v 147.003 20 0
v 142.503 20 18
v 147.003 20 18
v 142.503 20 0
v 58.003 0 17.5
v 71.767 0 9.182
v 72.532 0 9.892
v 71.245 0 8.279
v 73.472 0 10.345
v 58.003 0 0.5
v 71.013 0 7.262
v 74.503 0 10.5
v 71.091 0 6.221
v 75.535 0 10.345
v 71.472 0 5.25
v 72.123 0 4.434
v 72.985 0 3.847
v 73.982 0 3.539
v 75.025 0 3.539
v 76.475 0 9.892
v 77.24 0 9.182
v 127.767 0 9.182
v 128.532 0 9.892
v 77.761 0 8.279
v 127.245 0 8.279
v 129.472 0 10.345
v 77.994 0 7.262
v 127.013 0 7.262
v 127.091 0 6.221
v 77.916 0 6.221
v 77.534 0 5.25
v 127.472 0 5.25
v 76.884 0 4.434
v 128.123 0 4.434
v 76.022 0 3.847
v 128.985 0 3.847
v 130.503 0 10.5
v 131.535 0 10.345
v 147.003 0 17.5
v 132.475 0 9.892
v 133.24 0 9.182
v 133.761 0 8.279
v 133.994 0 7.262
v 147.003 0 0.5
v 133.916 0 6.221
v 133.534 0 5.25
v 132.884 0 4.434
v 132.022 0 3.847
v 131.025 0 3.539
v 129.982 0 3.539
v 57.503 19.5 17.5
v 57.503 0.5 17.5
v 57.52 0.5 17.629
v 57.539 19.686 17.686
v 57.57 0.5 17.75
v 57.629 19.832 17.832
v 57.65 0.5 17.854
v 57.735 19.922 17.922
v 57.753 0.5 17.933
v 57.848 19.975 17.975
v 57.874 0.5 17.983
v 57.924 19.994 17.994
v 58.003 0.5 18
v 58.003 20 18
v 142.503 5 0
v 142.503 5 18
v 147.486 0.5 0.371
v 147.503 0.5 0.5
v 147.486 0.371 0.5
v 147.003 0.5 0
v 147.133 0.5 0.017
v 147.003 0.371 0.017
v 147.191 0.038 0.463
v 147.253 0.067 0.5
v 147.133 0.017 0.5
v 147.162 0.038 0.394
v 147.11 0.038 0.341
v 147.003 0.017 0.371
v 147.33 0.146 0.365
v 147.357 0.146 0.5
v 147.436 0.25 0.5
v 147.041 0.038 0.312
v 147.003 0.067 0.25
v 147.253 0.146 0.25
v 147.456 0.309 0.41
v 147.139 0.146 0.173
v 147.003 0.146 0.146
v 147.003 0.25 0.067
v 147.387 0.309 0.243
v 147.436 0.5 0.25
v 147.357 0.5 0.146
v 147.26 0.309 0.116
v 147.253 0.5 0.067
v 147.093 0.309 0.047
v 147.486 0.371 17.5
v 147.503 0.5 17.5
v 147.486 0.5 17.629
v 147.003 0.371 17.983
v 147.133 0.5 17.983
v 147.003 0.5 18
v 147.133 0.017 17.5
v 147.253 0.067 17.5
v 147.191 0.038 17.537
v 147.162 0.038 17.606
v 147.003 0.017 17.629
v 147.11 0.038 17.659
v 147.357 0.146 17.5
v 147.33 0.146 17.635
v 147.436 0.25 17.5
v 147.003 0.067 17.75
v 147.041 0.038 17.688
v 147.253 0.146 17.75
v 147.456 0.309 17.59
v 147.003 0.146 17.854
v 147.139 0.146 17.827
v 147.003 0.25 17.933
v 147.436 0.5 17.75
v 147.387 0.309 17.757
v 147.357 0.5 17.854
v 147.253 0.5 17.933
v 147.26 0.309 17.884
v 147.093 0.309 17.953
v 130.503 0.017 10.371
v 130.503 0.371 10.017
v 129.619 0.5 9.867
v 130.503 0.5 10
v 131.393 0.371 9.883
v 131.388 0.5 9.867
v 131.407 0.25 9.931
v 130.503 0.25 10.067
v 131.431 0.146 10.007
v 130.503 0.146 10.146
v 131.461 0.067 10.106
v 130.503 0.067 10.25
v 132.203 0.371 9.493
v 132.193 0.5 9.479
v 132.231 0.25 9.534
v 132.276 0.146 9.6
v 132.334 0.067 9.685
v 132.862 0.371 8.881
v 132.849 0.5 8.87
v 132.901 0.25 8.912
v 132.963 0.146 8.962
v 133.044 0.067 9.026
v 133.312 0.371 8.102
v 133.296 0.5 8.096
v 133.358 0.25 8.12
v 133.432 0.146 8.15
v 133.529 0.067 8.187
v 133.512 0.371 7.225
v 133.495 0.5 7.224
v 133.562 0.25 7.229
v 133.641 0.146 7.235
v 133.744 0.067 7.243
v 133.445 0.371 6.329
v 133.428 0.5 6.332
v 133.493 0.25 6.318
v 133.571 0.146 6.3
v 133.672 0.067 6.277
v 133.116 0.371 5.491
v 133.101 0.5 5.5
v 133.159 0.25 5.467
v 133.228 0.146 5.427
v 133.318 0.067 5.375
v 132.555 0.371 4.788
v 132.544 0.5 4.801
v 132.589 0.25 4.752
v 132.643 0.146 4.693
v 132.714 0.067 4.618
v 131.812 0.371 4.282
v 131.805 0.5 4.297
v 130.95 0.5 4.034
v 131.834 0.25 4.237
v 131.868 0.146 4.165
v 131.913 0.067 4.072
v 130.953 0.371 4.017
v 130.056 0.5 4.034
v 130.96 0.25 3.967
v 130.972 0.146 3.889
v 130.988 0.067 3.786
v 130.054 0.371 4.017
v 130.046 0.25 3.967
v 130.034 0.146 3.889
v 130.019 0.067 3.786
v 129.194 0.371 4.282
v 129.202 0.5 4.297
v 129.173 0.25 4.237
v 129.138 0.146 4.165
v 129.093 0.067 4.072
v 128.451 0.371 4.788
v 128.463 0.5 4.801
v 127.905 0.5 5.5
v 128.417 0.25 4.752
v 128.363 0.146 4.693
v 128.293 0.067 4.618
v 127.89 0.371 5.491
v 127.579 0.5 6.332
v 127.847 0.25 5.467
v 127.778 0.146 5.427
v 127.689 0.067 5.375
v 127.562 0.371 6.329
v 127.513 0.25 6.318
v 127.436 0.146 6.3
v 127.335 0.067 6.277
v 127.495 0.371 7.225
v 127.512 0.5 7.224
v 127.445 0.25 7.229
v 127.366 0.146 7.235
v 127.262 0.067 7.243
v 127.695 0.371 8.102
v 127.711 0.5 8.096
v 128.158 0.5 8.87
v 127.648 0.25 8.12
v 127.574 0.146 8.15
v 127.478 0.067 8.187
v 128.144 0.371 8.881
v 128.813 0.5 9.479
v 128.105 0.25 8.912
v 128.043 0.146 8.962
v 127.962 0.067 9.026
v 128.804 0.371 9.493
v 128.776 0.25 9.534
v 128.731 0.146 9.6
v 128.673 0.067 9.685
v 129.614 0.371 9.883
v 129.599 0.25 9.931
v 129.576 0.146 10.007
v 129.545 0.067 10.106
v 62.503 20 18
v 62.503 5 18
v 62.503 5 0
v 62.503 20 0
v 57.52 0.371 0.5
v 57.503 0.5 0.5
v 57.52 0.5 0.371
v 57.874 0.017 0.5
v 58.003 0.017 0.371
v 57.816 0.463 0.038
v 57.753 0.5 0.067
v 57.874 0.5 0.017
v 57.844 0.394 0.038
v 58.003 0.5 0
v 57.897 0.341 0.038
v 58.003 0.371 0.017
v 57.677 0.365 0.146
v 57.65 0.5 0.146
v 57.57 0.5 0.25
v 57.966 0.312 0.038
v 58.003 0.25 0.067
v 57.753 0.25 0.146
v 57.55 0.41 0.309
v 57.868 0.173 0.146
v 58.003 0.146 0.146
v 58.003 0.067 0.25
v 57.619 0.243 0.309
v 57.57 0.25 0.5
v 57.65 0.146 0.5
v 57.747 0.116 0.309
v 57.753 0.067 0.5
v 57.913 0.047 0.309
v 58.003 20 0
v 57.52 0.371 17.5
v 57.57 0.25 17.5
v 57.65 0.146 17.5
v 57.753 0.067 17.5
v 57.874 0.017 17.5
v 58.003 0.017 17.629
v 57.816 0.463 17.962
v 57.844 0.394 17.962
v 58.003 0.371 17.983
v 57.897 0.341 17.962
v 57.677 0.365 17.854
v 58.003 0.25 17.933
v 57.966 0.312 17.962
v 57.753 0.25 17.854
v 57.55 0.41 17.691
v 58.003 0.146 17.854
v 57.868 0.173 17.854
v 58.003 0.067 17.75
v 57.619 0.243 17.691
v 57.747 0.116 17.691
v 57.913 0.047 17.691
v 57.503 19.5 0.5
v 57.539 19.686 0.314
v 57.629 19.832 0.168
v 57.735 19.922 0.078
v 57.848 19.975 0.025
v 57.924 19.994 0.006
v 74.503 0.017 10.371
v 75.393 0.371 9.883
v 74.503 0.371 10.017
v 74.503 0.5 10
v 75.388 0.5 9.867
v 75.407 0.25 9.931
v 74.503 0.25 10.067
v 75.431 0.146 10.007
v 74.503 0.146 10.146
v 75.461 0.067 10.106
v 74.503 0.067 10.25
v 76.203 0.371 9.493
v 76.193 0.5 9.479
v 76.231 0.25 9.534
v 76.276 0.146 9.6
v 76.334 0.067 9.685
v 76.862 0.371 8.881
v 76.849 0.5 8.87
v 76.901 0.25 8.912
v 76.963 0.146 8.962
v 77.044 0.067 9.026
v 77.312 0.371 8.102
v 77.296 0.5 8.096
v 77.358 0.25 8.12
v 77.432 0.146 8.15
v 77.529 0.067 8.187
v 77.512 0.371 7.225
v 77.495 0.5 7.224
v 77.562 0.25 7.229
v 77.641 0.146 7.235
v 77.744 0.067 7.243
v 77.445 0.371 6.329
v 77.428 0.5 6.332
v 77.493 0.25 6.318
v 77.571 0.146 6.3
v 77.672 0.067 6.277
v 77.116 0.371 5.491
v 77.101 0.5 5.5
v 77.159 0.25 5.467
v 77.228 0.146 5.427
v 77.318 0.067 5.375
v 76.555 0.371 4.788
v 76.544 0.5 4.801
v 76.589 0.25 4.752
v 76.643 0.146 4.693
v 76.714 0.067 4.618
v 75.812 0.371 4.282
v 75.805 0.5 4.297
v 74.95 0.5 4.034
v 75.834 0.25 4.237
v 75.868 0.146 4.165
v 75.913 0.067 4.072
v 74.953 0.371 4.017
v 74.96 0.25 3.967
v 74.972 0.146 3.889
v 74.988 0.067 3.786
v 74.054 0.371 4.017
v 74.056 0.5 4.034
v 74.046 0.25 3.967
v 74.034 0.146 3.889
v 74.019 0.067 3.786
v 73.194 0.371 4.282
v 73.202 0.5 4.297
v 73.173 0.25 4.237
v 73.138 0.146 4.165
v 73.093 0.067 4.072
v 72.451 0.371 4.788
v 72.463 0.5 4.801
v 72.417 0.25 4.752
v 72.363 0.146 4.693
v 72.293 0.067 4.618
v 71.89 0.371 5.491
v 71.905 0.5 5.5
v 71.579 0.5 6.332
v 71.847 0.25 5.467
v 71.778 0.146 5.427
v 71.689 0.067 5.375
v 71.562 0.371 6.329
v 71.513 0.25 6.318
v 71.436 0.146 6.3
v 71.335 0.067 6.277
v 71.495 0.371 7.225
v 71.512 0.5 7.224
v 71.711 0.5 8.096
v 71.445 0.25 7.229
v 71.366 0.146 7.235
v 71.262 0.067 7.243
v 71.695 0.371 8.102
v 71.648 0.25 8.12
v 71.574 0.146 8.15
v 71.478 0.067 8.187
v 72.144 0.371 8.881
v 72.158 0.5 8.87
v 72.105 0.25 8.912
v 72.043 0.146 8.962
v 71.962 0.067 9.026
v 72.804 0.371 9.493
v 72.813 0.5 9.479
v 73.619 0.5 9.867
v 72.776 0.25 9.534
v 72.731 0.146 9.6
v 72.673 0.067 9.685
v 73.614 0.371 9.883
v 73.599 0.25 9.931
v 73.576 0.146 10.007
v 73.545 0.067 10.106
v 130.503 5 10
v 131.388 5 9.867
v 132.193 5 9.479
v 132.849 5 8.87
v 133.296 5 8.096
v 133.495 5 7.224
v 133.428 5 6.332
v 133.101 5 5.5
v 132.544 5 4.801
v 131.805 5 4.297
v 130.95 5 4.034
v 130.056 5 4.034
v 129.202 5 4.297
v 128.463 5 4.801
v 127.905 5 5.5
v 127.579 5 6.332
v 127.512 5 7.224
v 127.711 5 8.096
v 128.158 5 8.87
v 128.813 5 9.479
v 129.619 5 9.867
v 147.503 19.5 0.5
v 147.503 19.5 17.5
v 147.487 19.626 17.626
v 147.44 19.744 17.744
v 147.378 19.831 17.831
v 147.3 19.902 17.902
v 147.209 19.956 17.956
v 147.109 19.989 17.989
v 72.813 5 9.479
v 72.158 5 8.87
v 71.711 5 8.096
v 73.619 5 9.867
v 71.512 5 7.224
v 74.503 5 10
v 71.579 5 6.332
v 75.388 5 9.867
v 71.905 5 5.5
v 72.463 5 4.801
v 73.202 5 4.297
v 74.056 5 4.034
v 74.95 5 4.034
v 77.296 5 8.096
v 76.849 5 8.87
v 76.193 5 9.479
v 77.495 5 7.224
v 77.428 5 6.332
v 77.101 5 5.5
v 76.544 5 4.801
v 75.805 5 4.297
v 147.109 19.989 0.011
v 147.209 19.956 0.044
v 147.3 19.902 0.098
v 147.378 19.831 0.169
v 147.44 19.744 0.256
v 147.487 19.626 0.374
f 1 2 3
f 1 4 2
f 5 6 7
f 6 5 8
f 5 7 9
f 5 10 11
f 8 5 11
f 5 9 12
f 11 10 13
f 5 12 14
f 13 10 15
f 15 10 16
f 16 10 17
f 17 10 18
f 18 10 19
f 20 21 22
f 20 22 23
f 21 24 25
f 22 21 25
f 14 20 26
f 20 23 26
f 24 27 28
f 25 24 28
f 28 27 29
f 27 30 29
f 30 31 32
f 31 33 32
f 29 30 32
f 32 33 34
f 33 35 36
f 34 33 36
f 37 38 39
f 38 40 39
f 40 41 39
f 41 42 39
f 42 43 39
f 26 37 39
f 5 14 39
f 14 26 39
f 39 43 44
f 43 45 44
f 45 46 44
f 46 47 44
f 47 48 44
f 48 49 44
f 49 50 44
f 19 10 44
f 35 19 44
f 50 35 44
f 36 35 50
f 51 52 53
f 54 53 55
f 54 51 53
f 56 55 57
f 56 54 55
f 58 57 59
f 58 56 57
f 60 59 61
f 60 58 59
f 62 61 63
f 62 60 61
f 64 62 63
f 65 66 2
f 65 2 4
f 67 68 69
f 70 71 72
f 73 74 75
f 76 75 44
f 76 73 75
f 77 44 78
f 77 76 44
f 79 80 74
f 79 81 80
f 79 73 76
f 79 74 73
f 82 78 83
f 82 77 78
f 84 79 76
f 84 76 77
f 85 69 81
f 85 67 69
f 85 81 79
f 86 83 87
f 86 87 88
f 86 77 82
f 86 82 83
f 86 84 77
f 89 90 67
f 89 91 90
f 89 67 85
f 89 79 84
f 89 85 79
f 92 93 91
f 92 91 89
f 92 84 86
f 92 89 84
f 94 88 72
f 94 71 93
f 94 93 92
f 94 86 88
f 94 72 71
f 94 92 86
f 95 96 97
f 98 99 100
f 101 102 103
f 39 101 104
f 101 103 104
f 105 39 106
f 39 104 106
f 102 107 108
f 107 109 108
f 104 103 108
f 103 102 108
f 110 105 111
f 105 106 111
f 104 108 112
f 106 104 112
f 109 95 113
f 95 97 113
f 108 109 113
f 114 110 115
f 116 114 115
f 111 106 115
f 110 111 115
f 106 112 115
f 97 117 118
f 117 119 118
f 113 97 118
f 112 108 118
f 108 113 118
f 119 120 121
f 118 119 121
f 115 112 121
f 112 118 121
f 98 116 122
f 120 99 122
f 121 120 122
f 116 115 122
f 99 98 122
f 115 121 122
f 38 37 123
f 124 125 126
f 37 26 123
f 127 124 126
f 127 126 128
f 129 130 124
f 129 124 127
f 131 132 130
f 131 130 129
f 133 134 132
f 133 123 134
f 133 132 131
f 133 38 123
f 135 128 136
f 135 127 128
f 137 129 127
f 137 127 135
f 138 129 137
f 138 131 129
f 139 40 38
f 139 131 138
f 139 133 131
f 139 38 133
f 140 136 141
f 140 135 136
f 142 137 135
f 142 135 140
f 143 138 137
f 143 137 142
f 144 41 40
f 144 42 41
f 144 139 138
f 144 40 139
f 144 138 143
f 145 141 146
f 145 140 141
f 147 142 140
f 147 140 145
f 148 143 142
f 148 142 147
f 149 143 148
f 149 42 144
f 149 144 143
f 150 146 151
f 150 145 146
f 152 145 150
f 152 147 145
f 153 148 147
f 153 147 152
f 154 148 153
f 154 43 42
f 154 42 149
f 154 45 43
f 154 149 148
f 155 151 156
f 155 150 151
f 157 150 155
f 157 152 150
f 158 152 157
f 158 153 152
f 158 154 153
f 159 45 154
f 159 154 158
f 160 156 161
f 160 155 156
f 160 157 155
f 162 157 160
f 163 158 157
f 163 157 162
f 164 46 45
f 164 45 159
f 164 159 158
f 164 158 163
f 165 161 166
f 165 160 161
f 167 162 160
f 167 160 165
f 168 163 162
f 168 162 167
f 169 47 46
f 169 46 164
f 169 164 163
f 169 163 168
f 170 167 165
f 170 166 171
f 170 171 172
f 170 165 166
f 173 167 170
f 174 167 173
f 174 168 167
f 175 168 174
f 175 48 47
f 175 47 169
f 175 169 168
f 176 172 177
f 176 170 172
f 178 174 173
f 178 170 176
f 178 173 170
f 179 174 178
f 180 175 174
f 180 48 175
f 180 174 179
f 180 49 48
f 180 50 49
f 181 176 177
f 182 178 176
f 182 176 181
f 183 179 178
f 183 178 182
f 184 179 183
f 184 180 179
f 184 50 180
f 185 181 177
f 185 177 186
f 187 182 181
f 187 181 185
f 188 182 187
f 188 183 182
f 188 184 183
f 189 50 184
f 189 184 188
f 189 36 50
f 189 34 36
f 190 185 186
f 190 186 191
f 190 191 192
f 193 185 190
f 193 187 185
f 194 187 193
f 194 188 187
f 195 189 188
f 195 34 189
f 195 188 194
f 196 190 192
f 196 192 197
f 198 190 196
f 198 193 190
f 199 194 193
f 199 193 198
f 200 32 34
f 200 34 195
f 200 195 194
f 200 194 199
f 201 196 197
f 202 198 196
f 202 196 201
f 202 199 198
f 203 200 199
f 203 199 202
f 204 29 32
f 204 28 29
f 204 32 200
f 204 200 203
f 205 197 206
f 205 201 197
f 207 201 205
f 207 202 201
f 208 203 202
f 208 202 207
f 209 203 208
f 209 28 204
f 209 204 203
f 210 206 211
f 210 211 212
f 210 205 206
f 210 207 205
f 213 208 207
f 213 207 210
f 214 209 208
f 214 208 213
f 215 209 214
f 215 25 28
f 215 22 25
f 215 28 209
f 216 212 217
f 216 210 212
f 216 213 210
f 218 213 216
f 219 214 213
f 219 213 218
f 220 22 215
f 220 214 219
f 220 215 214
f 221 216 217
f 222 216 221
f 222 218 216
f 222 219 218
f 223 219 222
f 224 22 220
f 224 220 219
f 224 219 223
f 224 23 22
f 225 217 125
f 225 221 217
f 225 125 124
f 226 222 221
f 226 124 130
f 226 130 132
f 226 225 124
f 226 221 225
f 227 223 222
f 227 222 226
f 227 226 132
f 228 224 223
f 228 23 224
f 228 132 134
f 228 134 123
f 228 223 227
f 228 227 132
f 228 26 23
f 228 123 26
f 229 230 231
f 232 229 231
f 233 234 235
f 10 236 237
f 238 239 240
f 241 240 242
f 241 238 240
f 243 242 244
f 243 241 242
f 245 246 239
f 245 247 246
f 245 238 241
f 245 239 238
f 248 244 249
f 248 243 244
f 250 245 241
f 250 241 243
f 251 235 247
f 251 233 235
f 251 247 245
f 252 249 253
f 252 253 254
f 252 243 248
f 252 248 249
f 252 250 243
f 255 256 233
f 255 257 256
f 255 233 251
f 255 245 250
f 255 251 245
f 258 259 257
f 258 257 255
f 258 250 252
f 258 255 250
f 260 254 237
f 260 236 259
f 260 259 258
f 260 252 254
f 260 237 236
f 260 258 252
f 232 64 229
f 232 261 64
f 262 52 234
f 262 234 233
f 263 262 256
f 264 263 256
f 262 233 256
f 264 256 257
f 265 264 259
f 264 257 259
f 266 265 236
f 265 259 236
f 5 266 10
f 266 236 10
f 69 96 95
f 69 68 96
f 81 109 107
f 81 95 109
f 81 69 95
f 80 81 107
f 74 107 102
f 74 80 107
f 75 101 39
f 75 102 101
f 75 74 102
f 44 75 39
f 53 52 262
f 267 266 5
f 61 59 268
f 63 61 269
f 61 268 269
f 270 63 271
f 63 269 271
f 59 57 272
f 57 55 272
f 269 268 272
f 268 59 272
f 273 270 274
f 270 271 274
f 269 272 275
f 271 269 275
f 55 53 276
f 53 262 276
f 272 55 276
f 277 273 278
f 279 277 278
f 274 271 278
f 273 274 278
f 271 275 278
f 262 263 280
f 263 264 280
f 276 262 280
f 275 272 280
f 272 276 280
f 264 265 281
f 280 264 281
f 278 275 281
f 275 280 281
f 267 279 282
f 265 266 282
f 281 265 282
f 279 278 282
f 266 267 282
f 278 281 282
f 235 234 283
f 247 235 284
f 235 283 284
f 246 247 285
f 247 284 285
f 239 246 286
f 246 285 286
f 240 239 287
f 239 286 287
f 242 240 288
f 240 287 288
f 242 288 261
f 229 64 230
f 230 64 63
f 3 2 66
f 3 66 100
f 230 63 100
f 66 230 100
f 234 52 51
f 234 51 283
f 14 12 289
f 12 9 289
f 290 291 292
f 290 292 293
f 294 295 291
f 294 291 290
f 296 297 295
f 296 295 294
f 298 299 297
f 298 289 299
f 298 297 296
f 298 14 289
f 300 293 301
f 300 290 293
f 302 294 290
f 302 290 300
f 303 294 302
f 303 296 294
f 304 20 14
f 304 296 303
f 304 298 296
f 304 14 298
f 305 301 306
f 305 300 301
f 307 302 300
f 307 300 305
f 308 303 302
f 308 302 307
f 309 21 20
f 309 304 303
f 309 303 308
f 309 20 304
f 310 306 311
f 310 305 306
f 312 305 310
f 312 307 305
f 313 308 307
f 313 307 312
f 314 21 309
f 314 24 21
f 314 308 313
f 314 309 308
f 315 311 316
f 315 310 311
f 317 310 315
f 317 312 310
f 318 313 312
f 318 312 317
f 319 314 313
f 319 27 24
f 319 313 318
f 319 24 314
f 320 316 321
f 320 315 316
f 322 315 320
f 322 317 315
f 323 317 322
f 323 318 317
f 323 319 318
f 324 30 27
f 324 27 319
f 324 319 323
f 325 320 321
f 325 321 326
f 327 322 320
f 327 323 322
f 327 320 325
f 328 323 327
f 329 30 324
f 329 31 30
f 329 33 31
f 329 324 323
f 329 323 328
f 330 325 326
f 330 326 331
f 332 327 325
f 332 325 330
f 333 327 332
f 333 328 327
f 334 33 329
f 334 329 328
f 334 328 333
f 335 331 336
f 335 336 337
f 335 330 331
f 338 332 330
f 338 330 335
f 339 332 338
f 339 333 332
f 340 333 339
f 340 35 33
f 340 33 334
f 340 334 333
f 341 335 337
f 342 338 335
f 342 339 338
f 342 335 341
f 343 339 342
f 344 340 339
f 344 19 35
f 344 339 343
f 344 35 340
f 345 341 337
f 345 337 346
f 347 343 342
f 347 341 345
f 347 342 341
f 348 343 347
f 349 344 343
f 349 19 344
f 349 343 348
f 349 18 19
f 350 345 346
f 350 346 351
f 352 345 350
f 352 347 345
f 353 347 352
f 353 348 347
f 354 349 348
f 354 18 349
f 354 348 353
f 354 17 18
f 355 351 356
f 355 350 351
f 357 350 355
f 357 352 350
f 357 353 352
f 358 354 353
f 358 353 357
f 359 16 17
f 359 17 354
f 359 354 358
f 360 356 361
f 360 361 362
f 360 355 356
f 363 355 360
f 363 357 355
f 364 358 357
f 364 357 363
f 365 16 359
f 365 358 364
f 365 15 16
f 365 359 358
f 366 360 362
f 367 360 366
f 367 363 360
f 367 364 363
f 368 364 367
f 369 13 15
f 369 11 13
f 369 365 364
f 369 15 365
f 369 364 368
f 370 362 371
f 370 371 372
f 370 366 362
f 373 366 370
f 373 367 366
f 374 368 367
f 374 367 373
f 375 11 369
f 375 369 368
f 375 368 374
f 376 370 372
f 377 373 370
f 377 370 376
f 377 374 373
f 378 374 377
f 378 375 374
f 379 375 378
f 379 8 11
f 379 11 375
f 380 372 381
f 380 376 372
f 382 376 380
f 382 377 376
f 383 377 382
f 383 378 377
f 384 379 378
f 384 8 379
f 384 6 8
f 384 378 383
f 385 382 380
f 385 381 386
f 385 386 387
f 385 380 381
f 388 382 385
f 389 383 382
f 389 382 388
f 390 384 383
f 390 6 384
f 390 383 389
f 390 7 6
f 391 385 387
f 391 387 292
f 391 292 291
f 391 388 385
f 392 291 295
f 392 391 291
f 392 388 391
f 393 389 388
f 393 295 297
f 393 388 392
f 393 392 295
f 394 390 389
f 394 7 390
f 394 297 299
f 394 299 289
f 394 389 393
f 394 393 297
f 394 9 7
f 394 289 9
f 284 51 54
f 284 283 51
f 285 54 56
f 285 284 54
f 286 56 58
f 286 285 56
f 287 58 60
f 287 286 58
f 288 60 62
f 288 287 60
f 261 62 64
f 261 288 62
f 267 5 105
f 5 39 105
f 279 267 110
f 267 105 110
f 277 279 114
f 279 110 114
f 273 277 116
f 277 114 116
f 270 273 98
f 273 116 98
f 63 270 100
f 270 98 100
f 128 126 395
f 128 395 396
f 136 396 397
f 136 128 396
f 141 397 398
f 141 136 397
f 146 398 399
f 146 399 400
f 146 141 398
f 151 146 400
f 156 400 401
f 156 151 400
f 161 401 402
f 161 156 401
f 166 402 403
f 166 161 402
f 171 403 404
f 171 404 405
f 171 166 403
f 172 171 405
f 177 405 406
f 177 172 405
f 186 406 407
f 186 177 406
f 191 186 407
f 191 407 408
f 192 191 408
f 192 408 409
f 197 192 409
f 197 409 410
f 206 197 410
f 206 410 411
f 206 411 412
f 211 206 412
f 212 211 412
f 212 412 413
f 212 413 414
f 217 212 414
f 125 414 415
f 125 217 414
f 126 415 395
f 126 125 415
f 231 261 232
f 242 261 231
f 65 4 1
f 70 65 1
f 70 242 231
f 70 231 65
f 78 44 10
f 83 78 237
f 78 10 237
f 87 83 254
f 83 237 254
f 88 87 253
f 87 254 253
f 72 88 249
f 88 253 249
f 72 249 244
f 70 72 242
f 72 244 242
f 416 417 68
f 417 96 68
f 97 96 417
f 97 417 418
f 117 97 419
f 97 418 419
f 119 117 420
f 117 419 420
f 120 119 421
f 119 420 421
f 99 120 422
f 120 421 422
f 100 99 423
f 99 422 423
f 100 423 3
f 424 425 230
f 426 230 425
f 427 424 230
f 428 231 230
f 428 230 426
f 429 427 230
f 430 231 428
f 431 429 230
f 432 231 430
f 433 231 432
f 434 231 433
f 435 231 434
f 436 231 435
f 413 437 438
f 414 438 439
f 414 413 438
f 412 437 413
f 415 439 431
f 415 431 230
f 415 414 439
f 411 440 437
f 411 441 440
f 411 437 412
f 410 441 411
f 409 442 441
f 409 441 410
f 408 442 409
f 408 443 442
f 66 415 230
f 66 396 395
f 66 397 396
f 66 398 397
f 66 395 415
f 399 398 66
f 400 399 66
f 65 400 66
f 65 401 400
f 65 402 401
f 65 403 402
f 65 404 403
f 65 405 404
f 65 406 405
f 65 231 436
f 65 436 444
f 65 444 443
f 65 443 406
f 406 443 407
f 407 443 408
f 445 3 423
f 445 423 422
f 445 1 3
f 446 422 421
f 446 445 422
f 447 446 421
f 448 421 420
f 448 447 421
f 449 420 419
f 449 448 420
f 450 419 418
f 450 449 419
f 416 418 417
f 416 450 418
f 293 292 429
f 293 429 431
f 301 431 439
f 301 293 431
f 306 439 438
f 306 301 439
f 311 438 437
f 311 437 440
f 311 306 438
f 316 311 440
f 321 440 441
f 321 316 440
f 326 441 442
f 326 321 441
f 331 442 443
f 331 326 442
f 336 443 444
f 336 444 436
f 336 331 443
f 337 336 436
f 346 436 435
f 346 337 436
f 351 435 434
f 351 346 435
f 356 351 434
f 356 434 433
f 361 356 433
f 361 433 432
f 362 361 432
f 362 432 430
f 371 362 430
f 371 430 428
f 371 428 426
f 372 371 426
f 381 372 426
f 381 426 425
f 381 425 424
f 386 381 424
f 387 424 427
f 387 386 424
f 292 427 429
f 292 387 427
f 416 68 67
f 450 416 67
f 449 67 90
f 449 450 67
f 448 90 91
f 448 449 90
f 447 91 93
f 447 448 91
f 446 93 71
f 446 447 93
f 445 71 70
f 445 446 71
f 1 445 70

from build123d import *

# Parameters (mm, degrees)
SKETCH1_W           = 80
SKETCH1_H           = 18
SKETCH1_R           = 3
BOSS_EXTRUDE1_DEPTH = 5
SKETCH1_6_W         = 5
SKETCH1_6_H         = 18
BOSS_EXTRUDE2_DEPTH = 20
FILLET1_R           = 0.5


with BuildPart() as part:
    # Sketch1 → Boss-Extrude1 (new body)
    with BuildSketch(Plane(origin=(0, 0, 0), x_dir=(1, 0, 0), z_dir=(0, 1, 0))):
        with Locations((102.5033, -9)):
            Rectangle(SKETCH1_W, SKETCH1_H)
        with Locations((74.5033, -7)):
            Circle(SKETCH1_R, mode=Mode.SUBTRACT)
        with Locations((130.5033, -7)):
            Circle(SKETCH1_R, mode=Mode.SUBTRACT)
    extrude(amount=BOSS_EXTRUDE1_DEPTH)

    # Sketch1<6> → Boss-Extrude2 (add)
    with BuildSketch(Plane(origin=(0, 0, 0), x_dir=(1, 0, 0), z_dir=(0, 1, 0))):
        with Locations((145.0033, -9)):
            Rectangle(SKETCH1_6_W, SKETCH1_6_H)
        with Locations((60.0033, -9)):
            Rectangle(SKETCH1_6_W, SKETCH1_6_H)
    extrude(amount=BOSS_EXTRUDE2_DEPTH)

    # Fillet1
    fillet1_edges = [part.edges().sort_by_distance(p)[0] for p in [
        (57.5033, 10, 0),
        (57.5033, 20, 9),
        (57.5033, 10, 18),
        (57.5033, 0, 9),
        (102.5033, 0, 18),
        (102.5033, 0, 0),
        (71.5033, 0, 7),
        (127.5033, 0, 7),
        (147.5033, 10, 18),
        (147.5033, 20, 9),
        (147.5033, 10, 0),
        (147.5033, 0, 9),
    ]]
    fillet(fillet1_edges, radius=FILLET1_R)


solid = part.part
